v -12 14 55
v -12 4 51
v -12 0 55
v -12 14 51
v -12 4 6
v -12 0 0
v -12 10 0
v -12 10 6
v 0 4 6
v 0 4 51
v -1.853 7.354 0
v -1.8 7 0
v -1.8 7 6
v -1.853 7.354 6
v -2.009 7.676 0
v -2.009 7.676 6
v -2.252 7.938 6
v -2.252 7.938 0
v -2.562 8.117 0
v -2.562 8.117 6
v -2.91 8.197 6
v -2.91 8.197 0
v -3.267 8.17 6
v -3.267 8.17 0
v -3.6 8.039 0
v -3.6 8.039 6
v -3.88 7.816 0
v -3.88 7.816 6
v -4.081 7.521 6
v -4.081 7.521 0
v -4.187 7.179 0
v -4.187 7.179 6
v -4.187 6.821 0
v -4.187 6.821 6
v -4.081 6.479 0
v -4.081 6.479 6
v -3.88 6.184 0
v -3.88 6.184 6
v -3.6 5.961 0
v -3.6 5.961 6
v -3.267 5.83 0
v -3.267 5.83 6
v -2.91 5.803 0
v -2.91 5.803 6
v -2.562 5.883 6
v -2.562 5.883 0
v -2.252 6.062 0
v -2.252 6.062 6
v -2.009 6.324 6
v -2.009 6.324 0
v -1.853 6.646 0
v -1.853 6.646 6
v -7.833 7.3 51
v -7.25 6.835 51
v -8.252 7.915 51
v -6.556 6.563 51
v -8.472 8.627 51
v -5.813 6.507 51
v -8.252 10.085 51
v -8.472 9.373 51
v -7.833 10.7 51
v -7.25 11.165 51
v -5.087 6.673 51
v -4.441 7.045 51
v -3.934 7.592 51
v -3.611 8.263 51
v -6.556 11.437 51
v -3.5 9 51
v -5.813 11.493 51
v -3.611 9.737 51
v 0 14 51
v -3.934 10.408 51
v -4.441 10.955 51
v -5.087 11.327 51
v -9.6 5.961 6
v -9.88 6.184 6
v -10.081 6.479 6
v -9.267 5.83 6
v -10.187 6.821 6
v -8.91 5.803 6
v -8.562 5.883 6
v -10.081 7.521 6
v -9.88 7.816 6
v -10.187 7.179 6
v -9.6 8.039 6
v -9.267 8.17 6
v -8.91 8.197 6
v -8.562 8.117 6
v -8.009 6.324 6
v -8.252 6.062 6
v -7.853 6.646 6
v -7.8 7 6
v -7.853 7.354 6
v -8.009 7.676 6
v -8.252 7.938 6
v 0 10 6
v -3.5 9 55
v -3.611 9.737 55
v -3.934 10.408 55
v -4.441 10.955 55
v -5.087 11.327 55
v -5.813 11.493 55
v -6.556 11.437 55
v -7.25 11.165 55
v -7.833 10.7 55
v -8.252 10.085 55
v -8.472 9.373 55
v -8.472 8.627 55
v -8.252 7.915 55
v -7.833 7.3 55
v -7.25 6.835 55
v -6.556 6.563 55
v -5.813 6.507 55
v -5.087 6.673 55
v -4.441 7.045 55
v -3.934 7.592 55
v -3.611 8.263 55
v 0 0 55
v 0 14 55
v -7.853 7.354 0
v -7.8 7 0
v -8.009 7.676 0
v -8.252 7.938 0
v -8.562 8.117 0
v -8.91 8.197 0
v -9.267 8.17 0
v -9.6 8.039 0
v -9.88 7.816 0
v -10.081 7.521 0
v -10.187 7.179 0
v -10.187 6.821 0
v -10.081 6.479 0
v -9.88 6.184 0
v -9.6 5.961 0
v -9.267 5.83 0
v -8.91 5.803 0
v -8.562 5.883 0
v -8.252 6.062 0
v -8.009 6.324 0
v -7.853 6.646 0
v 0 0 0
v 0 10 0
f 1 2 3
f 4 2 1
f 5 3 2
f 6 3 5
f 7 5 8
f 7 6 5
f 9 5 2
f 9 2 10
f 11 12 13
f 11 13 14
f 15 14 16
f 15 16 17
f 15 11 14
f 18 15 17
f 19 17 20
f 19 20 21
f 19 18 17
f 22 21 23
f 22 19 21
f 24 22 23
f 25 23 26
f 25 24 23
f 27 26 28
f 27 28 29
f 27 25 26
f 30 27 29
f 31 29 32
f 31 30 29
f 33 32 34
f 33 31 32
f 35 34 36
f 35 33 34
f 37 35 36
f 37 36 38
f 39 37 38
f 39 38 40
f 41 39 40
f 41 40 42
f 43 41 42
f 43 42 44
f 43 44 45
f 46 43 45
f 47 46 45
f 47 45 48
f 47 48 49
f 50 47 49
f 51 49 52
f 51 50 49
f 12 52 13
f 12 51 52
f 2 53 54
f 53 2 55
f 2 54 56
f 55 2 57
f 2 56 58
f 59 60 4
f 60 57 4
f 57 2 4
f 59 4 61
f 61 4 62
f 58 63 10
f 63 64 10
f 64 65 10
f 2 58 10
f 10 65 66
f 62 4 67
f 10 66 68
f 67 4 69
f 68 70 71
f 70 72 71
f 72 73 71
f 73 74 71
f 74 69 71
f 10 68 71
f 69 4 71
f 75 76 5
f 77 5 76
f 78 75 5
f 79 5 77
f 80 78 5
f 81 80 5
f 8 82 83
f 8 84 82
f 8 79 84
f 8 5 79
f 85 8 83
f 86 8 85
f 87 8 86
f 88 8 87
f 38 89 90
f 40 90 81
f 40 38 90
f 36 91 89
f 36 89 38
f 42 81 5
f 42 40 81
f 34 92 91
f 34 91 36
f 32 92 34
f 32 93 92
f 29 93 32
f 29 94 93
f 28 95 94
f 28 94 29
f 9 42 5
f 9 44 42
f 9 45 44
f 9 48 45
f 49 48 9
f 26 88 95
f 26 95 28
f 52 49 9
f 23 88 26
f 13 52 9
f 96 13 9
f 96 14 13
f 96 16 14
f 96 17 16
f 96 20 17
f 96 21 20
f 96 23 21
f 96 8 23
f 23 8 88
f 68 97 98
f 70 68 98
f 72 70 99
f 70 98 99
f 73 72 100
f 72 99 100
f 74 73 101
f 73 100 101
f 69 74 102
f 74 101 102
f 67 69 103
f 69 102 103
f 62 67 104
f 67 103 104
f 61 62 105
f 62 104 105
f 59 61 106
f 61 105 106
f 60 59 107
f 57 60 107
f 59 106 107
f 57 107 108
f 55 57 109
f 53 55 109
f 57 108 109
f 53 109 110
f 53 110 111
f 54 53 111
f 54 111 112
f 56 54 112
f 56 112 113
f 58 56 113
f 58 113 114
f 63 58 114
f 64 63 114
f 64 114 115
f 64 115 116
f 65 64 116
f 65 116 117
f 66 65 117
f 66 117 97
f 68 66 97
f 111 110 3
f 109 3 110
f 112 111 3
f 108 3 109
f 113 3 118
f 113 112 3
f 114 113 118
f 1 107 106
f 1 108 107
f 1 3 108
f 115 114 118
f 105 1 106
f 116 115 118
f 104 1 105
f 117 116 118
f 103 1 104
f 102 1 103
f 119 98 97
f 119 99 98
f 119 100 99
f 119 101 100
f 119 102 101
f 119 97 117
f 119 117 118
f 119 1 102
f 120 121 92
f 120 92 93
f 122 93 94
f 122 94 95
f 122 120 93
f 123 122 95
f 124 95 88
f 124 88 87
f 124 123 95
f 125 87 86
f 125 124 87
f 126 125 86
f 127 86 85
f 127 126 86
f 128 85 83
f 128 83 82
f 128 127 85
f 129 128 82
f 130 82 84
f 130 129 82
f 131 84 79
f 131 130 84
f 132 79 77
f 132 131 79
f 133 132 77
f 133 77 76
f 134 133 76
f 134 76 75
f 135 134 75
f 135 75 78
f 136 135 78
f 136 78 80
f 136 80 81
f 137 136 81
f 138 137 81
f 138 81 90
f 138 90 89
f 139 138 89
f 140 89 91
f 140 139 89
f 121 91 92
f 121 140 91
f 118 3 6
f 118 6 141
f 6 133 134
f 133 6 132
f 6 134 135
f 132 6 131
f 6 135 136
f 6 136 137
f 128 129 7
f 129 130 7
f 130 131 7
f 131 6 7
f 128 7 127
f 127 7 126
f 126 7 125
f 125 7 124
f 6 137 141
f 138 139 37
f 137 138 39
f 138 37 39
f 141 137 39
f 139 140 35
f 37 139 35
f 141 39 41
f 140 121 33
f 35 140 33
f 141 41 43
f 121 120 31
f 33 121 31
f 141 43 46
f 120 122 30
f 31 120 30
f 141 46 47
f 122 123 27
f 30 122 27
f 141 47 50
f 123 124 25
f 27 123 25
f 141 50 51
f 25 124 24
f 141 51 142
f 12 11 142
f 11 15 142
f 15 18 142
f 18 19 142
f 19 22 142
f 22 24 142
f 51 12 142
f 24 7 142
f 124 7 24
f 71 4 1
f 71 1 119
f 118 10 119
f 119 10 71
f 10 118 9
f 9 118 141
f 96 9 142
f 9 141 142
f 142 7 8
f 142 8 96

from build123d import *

# Parameters (mm, degrees)
SKETCH_W     = 12
SKETCH_H     = 10
SKETCH_R     = 1.2
PAD_DEPTH    = 6
SKETCH001_W  = 12
SKETCH001_H  = 4
PAD001_DEPTH = 45
SKETCH002_W  = 12
SKETCH002_H  = 14
PAD002_DEPTH = 4
SKETCH005_R  = 2.5
POCKET_DEPTH = 5


with BuildPart() as part:
    # Sketch → Pad (new body)
    with BuildSketch(Plane.XY):
        with Locations((-6, 5)):
            Rectangle(SKETCH_W, SKETCH_H)
        with Locations((-9, 7)):
            Circle(SKETCH_R, mode=Mode.SUBTRACT)
        with Locations((-3, 7)):
            Circle(SKETCH_R, mode=Mode.SUBTRACT)
    extrude(amount=PAD_DEPTH)

    # Sketch001 (on Face8 of Pad) → Pad001 (join)
    with BuildSketch(Plane.XY.offset(6)):
        with Locations((-6, 2)):
            Rectangle(SKETCH001_W, SKETCH001_H)
    extrude(amount=PAD001_DEPTH)

    # Sketch002 (on Face13 of Pad001) → Pad002 (join)
    with BuildSketch(Plane.XY.offset(51)):
        with Locations((-6, 7)):
            Rectangle(SKETCH002_W, SKETCH002_H)
    extrude(amount=PAD002_DEPTH)

    # Sketch005 (on Face18 of Pad002) → Pocket (cut)
    with BuildSketch(Plane.XY.offset(55)):
        with Locations((-6, 9)):
            Circle(SKETCH005_R)
    extrude(amount=-POCKET_DEPTH, mode=Mode.SUBTRACT)


solid = part.part
